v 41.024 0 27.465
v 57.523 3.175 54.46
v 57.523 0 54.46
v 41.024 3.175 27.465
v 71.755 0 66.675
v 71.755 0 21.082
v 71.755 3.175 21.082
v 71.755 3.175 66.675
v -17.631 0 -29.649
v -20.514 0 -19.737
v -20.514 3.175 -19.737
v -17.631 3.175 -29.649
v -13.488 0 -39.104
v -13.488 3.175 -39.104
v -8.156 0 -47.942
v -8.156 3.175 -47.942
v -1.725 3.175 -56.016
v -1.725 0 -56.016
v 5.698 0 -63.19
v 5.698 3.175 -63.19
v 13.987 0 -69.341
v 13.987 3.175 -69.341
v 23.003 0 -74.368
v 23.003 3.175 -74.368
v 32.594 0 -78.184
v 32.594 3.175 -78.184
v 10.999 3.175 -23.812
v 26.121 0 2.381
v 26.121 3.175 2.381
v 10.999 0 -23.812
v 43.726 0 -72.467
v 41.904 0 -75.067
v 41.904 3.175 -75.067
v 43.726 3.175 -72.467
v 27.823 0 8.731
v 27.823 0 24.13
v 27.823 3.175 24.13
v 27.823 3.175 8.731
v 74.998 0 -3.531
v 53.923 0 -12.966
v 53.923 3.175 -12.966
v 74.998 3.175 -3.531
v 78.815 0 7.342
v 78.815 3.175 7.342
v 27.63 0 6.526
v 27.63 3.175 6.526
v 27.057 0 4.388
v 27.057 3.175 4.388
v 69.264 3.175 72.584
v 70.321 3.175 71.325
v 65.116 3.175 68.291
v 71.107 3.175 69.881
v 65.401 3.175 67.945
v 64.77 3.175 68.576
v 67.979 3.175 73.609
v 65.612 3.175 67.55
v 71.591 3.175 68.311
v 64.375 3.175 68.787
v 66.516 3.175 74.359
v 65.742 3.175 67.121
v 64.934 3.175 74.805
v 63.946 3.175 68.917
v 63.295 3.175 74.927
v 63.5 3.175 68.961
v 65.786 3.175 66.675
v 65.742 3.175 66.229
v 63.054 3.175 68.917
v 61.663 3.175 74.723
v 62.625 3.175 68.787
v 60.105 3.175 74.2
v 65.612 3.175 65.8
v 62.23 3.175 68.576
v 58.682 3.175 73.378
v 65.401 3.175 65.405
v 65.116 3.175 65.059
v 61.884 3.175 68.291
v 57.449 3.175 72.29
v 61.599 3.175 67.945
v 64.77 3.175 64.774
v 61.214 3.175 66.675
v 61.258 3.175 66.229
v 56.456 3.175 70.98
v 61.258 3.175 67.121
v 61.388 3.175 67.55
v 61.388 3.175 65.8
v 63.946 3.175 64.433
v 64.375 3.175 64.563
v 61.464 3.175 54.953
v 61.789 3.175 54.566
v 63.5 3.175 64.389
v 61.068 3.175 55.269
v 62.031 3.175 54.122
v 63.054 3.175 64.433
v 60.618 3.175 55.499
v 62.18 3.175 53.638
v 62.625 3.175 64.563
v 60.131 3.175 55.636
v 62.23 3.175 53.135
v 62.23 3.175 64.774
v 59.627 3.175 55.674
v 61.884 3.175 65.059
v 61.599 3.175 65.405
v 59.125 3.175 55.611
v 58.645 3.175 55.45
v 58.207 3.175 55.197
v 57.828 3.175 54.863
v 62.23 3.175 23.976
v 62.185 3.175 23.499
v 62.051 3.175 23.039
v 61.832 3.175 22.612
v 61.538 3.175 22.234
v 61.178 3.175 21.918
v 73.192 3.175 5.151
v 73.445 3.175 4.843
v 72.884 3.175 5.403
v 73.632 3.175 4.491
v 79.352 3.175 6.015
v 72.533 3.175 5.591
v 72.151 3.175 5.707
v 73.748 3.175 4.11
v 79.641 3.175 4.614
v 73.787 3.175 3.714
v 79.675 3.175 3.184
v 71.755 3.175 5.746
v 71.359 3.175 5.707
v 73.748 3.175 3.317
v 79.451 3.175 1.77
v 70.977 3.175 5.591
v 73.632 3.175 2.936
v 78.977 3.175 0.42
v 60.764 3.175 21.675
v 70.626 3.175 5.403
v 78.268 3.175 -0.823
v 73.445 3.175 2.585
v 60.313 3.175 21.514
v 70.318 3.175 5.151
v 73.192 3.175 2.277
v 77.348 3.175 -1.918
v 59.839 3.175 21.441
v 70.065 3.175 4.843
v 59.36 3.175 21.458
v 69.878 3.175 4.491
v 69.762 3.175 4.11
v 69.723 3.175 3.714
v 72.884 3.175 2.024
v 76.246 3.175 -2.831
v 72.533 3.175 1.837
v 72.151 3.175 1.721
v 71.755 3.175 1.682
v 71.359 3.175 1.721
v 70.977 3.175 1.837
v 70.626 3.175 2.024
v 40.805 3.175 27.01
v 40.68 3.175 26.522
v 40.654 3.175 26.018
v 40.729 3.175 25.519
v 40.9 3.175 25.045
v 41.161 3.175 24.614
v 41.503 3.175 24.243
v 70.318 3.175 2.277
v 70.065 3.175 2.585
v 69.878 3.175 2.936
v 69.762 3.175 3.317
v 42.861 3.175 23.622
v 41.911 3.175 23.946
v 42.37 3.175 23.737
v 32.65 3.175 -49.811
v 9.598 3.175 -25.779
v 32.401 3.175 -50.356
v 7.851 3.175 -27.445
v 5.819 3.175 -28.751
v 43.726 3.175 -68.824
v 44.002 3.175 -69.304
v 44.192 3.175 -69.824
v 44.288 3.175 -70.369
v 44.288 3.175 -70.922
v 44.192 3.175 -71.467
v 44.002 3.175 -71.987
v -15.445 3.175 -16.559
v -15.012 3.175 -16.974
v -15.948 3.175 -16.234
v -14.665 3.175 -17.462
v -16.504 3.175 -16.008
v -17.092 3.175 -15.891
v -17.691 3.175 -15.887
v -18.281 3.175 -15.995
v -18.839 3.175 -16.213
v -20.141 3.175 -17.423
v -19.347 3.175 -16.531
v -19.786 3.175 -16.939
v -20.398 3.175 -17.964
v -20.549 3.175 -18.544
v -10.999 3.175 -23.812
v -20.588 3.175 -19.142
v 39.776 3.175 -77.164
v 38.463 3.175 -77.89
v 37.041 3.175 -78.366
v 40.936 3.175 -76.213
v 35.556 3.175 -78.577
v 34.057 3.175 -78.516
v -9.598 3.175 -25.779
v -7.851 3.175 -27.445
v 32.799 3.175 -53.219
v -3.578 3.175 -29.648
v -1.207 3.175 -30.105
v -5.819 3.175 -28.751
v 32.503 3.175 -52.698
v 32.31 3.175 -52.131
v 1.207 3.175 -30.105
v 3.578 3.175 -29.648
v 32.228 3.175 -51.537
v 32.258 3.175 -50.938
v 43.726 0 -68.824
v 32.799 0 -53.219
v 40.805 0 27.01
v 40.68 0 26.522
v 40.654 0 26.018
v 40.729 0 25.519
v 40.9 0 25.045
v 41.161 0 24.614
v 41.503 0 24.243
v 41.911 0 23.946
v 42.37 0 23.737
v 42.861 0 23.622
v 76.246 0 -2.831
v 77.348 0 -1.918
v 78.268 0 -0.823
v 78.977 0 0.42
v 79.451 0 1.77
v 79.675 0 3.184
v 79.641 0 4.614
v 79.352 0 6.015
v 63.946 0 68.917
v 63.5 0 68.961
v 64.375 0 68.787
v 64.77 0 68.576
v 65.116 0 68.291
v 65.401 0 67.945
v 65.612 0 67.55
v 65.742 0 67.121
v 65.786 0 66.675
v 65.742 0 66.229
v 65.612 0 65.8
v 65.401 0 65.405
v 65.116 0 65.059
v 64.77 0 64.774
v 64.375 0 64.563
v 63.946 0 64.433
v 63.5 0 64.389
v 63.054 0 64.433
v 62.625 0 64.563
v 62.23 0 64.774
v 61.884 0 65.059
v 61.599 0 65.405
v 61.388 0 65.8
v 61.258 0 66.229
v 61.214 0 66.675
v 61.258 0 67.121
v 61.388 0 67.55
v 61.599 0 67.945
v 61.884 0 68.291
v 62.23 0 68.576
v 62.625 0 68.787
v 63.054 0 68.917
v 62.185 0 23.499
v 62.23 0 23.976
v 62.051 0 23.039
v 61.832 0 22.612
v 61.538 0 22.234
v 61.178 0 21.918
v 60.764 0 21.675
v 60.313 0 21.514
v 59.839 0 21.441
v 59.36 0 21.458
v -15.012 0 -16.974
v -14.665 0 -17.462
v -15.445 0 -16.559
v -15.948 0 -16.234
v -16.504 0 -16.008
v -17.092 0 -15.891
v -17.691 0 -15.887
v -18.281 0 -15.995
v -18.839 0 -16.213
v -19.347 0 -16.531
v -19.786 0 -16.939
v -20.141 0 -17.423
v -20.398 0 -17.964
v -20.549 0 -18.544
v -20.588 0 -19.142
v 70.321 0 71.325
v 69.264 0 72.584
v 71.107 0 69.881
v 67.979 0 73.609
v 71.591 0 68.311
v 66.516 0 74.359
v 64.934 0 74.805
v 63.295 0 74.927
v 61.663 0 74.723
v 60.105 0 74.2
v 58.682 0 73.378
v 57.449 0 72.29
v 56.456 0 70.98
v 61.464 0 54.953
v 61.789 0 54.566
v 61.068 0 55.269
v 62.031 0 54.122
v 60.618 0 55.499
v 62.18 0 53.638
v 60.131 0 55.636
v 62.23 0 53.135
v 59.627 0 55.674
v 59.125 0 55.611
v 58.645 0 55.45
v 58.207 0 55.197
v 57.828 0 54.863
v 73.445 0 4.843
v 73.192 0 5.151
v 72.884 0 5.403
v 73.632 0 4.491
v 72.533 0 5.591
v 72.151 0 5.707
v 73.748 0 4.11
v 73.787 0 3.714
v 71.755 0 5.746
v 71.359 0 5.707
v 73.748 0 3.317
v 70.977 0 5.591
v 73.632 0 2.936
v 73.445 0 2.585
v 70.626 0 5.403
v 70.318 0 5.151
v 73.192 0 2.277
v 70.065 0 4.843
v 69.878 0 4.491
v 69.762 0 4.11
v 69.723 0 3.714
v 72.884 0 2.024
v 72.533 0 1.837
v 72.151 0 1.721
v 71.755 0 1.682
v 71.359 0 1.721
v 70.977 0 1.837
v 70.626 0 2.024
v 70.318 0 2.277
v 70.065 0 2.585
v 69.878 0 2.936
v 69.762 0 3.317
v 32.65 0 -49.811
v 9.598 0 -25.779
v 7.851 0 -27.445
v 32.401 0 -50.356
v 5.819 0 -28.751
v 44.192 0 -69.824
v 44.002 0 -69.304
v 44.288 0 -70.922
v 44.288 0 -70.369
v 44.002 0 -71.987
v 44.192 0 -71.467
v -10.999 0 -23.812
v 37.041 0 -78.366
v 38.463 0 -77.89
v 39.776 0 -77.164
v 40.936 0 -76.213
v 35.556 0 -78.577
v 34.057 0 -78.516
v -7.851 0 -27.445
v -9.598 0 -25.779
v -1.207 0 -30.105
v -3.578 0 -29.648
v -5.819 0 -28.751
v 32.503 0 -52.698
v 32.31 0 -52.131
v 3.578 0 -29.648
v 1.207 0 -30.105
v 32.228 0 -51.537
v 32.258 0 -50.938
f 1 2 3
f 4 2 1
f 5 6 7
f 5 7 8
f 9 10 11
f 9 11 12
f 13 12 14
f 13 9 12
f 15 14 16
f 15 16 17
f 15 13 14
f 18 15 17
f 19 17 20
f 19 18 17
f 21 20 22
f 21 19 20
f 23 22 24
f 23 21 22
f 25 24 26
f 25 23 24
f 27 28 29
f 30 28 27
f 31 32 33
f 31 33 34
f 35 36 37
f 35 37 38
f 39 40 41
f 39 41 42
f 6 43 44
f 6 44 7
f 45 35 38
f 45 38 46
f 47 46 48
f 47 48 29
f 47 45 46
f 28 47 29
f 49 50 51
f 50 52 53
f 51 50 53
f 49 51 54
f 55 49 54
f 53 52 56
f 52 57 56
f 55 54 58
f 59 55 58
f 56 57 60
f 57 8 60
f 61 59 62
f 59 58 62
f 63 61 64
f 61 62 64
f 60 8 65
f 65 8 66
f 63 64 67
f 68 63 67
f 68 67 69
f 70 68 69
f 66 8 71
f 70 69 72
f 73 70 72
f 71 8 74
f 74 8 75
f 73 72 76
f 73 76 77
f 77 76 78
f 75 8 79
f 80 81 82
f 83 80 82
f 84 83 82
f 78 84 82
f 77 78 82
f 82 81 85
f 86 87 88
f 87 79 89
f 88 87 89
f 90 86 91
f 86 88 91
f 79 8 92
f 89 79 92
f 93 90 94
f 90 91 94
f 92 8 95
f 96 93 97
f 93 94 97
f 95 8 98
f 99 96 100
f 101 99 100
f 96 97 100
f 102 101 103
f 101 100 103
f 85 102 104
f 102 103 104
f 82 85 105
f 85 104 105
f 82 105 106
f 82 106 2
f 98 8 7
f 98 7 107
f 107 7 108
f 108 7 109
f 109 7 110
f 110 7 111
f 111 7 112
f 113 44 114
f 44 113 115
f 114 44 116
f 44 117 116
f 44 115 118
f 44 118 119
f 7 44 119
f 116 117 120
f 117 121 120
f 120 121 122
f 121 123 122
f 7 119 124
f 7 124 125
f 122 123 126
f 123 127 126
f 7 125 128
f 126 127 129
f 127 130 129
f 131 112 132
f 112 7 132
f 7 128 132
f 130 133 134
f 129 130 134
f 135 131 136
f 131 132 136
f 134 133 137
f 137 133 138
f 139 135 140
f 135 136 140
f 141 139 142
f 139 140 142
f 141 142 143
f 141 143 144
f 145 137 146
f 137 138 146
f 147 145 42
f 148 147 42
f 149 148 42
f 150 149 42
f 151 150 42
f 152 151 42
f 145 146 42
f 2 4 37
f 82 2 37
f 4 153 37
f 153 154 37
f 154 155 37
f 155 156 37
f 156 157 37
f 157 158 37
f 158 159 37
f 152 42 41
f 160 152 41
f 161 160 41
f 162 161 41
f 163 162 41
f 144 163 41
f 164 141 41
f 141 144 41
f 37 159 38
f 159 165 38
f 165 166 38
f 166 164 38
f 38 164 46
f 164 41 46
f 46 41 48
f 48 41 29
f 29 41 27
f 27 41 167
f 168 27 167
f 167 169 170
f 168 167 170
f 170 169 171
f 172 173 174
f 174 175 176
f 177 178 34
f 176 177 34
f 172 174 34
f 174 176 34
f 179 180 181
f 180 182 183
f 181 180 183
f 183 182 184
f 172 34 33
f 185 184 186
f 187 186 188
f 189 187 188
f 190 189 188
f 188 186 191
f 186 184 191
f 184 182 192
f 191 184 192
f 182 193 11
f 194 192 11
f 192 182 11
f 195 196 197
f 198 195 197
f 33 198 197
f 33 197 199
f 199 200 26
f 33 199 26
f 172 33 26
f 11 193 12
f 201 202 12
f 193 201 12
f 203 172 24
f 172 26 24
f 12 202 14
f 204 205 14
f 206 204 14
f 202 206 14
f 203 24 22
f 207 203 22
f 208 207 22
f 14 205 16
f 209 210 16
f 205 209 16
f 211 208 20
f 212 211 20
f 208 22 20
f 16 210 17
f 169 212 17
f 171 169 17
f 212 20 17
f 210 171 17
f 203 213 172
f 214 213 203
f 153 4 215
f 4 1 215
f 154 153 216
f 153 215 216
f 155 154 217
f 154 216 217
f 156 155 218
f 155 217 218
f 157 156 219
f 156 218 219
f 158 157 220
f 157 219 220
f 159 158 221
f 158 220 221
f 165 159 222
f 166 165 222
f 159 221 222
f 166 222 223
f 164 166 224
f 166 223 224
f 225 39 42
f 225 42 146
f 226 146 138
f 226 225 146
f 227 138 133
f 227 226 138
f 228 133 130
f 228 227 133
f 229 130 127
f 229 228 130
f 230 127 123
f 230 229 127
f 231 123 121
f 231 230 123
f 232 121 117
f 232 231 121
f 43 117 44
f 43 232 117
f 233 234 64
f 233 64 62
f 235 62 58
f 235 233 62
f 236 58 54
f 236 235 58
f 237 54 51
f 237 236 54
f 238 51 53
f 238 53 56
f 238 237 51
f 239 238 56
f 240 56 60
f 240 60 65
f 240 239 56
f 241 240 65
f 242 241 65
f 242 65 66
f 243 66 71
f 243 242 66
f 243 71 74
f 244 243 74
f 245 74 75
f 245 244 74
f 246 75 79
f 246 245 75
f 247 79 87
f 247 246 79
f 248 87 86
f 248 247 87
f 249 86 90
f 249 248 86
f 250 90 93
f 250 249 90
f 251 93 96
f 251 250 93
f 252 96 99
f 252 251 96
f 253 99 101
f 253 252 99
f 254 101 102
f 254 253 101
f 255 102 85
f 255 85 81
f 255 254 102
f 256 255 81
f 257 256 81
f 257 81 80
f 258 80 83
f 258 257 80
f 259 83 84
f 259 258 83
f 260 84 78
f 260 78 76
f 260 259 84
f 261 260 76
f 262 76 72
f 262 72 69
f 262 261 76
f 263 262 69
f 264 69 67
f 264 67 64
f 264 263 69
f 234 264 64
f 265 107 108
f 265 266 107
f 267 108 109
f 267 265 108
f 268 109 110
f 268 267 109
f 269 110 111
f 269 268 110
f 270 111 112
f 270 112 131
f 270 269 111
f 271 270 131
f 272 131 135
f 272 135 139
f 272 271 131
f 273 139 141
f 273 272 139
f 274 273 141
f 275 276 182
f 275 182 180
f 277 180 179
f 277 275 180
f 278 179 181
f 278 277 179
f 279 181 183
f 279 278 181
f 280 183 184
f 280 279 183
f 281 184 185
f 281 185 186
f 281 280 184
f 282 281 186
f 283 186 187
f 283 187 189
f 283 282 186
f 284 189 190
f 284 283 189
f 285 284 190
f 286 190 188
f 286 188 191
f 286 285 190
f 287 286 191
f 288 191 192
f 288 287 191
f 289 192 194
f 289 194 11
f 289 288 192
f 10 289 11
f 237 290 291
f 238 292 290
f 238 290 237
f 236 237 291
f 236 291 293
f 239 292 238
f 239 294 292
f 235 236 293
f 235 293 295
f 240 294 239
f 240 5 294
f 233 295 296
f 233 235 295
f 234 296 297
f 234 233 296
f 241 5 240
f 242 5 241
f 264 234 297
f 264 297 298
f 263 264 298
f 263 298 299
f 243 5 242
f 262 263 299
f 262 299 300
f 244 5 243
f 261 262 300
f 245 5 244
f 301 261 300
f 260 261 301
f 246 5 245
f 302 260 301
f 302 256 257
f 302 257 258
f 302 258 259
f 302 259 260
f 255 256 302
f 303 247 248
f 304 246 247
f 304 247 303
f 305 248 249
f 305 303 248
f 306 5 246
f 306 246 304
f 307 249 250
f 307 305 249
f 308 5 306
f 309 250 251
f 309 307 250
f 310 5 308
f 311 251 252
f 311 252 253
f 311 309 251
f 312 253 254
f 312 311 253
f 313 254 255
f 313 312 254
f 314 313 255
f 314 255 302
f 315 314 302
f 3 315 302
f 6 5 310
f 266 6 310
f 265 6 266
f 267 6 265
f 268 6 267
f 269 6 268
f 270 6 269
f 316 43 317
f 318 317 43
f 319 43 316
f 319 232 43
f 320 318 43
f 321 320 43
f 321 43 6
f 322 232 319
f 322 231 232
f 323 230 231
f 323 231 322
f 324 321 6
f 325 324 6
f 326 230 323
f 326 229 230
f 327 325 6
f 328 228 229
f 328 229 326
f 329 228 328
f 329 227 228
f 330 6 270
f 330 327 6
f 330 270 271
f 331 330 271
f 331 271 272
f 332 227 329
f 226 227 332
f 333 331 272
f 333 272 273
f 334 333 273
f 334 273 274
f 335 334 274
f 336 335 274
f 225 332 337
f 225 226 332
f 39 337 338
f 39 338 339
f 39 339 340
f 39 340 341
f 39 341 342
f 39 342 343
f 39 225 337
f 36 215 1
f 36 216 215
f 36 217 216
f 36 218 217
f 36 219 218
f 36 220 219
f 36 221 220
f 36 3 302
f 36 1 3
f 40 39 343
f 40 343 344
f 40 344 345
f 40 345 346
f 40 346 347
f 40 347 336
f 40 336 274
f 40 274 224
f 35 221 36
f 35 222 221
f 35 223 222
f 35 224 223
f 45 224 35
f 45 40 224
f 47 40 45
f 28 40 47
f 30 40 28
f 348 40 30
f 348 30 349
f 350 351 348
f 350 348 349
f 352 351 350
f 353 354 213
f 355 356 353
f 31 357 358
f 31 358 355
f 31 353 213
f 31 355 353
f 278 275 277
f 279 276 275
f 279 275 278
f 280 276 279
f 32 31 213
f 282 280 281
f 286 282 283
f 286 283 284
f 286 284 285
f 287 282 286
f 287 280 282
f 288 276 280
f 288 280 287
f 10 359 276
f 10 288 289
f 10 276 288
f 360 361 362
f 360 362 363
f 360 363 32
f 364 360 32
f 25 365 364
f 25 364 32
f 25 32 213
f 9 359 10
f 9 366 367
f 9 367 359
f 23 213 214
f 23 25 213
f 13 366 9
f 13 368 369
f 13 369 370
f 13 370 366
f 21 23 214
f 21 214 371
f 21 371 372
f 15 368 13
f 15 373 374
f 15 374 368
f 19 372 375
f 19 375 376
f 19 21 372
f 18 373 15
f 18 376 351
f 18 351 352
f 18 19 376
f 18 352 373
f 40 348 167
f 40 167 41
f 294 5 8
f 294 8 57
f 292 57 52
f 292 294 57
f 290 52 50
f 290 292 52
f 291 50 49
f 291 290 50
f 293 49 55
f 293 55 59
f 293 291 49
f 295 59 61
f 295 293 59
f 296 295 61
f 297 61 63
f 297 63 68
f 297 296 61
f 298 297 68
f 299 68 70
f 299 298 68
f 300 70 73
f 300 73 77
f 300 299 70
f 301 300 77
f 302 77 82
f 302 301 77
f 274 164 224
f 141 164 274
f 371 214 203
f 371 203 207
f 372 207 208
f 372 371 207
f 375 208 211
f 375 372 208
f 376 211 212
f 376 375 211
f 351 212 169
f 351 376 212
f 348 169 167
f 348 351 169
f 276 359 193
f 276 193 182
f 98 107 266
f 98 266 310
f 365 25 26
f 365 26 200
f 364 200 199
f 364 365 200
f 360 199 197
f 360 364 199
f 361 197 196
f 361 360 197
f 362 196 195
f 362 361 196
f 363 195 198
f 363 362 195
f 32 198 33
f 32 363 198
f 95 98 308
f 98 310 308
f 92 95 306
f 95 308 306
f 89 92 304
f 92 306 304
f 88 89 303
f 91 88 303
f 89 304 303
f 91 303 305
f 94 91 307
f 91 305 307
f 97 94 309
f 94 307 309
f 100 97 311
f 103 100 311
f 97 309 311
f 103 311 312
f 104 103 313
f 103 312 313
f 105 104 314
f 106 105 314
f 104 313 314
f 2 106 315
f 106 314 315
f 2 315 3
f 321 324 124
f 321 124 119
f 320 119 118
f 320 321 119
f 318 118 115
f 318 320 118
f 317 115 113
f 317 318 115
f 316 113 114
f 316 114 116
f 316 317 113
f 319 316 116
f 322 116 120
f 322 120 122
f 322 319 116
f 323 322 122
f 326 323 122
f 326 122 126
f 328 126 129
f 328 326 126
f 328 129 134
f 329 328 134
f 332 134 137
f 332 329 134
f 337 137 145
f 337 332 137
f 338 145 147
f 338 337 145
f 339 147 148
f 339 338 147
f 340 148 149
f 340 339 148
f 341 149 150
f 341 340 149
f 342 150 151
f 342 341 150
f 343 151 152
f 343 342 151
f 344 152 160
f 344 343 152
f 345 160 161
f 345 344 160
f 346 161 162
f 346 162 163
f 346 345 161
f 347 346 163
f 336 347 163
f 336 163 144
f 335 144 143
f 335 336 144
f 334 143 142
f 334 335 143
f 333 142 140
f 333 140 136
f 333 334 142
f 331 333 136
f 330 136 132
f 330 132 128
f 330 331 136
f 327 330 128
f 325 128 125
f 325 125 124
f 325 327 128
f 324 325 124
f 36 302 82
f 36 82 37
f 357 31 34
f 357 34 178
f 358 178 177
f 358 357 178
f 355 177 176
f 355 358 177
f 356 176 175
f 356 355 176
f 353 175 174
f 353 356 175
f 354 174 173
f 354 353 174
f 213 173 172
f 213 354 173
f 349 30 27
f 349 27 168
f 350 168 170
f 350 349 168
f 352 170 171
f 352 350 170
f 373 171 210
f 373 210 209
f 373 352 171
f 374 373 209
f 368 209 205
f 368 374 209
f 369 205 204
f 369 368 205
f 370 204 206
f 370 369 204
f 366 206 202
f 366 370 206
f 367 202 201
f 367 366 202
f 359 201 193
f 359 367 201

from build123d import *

# Parameters (mm, degrees)
SKETCH1_R           = 2.286
SKETCH1_R_2         = 2.032
BOSS_EXTRUDE1_DEPTH = 3.175
CUT_EXTRUDE2_DEPTH  = 112.968585757
FILLET2_R           = 2.54


with BuildPart() as part:
    # Sketch1 → Boss-Extrude1 (new body)
    with BuildSketch(Plane(origin=(0, 0, 0), x_dir=(1, 0, 0), z_dir=(0, 1, 0))):
        with BuildLine():
            Line((-10.998522628, 23.8125), (-14.664696837, 17.4625))
            ThreePointArc((-14.664696837, 17.4625), (-18.565068266, 16.090875015), (-20.514067317, 19.737195774))
            ThreePointArc((-20.514067317, 19.737195774), (-1.724819928, 56.016331719), (32.594151192, 78.184320885))
            ThreePointArc((32.594151192, 78.184320885), (37.76306443, 78.160416217), (41.904450725, 75.06733441))
            Line((41.904450725, 75.06733441), (43.72555591, 72.466526669))
            ThreePointArc((43.72555591, 72.466526669), (44.299748169, 70.645421484), (43.72555591, 68.824316299))
            Line((43.72555591, 68.824316299), (32.798924798, 53.219469855))
            ThreePointArc((32.798924798, 53.219469855), (32.227754435, 51.536856224), (32.650101881, 49.81086467))
            Line((32.650101881, 49.81086467), (53.922601881, 12.965813866))
            Line((53.922601881, 12.965813866), (74.99824615, 3.5308098))
            ThreePointArc((74.99824615, 3.5308098), (79.244408325, -1.084665848), (78.815031546, -7.341513637))
            Line((78.815031546, -7.341513637), (71.755, -21.081542183))
            Line((71.755, -21.081542183), (71.755, -66.675))
            ThreePointArc((71.755, -66.675), (65.736035896, -74.621393426), (56.456352278, -70.979886963))
            Line((56.456352278, -70.979886963), (27.822968614, -24.13))
            Line((27.822968614, -24.13), (27.822968614, -8.73125))
            ThreePointArc((27.822968614, -8.73125), (27.390226607, -5.444248127), (26.121491242, -2.38125))
            Line((26.121491242, -2.38125), (10.998522628, 23.8125))
            ThreePointArc((10.998522628, 23.8125), (0, 30.1625), (-10.998522628, 23.8125))
        make_face()
        with Locations(Location((63.5, -66.675, 0), (0, 0, 270))):
            Circle(SKETCH1_R, mode=Mode.SUBTRACT)
        with Locations(Location((71.755, -3.713861391, 0), (0, 0, 270))):
            Circle(SKETCH1_R_2, mode=Mode.SUBTRACT)
    extrude(amount=BOSS_EXTRUDE1_DEPTH)

    # Sketch4 → Cut-Extrude2 (cut, through all)
    with BuildSketch(Plane(origin=(0, 3.175, 0), x_dir=(1, 0, 0), z_dir=(0, 1, 0))):
        Polygon((38.986058834, -24.13), (62.23, -21.081542183), (62.23, -62.161691573), align=None)
    extrude(amount=-CUT_EXTRUDE2_DEPTH, mode=Mode.SUBTRACT)

    # Fillet2
    fillet2_edges = [part.edges().sort_by_distance(p)[0] for p in [
        (62.23, 1.5875, 62.161691573),
        (38.986058834, 1.5875, 24.13),
        (62.23, 1.5875, 21.081542183),
    ]]
    fillet(fillet2_edges, radius=FILLET2_R)


solid = part.part
